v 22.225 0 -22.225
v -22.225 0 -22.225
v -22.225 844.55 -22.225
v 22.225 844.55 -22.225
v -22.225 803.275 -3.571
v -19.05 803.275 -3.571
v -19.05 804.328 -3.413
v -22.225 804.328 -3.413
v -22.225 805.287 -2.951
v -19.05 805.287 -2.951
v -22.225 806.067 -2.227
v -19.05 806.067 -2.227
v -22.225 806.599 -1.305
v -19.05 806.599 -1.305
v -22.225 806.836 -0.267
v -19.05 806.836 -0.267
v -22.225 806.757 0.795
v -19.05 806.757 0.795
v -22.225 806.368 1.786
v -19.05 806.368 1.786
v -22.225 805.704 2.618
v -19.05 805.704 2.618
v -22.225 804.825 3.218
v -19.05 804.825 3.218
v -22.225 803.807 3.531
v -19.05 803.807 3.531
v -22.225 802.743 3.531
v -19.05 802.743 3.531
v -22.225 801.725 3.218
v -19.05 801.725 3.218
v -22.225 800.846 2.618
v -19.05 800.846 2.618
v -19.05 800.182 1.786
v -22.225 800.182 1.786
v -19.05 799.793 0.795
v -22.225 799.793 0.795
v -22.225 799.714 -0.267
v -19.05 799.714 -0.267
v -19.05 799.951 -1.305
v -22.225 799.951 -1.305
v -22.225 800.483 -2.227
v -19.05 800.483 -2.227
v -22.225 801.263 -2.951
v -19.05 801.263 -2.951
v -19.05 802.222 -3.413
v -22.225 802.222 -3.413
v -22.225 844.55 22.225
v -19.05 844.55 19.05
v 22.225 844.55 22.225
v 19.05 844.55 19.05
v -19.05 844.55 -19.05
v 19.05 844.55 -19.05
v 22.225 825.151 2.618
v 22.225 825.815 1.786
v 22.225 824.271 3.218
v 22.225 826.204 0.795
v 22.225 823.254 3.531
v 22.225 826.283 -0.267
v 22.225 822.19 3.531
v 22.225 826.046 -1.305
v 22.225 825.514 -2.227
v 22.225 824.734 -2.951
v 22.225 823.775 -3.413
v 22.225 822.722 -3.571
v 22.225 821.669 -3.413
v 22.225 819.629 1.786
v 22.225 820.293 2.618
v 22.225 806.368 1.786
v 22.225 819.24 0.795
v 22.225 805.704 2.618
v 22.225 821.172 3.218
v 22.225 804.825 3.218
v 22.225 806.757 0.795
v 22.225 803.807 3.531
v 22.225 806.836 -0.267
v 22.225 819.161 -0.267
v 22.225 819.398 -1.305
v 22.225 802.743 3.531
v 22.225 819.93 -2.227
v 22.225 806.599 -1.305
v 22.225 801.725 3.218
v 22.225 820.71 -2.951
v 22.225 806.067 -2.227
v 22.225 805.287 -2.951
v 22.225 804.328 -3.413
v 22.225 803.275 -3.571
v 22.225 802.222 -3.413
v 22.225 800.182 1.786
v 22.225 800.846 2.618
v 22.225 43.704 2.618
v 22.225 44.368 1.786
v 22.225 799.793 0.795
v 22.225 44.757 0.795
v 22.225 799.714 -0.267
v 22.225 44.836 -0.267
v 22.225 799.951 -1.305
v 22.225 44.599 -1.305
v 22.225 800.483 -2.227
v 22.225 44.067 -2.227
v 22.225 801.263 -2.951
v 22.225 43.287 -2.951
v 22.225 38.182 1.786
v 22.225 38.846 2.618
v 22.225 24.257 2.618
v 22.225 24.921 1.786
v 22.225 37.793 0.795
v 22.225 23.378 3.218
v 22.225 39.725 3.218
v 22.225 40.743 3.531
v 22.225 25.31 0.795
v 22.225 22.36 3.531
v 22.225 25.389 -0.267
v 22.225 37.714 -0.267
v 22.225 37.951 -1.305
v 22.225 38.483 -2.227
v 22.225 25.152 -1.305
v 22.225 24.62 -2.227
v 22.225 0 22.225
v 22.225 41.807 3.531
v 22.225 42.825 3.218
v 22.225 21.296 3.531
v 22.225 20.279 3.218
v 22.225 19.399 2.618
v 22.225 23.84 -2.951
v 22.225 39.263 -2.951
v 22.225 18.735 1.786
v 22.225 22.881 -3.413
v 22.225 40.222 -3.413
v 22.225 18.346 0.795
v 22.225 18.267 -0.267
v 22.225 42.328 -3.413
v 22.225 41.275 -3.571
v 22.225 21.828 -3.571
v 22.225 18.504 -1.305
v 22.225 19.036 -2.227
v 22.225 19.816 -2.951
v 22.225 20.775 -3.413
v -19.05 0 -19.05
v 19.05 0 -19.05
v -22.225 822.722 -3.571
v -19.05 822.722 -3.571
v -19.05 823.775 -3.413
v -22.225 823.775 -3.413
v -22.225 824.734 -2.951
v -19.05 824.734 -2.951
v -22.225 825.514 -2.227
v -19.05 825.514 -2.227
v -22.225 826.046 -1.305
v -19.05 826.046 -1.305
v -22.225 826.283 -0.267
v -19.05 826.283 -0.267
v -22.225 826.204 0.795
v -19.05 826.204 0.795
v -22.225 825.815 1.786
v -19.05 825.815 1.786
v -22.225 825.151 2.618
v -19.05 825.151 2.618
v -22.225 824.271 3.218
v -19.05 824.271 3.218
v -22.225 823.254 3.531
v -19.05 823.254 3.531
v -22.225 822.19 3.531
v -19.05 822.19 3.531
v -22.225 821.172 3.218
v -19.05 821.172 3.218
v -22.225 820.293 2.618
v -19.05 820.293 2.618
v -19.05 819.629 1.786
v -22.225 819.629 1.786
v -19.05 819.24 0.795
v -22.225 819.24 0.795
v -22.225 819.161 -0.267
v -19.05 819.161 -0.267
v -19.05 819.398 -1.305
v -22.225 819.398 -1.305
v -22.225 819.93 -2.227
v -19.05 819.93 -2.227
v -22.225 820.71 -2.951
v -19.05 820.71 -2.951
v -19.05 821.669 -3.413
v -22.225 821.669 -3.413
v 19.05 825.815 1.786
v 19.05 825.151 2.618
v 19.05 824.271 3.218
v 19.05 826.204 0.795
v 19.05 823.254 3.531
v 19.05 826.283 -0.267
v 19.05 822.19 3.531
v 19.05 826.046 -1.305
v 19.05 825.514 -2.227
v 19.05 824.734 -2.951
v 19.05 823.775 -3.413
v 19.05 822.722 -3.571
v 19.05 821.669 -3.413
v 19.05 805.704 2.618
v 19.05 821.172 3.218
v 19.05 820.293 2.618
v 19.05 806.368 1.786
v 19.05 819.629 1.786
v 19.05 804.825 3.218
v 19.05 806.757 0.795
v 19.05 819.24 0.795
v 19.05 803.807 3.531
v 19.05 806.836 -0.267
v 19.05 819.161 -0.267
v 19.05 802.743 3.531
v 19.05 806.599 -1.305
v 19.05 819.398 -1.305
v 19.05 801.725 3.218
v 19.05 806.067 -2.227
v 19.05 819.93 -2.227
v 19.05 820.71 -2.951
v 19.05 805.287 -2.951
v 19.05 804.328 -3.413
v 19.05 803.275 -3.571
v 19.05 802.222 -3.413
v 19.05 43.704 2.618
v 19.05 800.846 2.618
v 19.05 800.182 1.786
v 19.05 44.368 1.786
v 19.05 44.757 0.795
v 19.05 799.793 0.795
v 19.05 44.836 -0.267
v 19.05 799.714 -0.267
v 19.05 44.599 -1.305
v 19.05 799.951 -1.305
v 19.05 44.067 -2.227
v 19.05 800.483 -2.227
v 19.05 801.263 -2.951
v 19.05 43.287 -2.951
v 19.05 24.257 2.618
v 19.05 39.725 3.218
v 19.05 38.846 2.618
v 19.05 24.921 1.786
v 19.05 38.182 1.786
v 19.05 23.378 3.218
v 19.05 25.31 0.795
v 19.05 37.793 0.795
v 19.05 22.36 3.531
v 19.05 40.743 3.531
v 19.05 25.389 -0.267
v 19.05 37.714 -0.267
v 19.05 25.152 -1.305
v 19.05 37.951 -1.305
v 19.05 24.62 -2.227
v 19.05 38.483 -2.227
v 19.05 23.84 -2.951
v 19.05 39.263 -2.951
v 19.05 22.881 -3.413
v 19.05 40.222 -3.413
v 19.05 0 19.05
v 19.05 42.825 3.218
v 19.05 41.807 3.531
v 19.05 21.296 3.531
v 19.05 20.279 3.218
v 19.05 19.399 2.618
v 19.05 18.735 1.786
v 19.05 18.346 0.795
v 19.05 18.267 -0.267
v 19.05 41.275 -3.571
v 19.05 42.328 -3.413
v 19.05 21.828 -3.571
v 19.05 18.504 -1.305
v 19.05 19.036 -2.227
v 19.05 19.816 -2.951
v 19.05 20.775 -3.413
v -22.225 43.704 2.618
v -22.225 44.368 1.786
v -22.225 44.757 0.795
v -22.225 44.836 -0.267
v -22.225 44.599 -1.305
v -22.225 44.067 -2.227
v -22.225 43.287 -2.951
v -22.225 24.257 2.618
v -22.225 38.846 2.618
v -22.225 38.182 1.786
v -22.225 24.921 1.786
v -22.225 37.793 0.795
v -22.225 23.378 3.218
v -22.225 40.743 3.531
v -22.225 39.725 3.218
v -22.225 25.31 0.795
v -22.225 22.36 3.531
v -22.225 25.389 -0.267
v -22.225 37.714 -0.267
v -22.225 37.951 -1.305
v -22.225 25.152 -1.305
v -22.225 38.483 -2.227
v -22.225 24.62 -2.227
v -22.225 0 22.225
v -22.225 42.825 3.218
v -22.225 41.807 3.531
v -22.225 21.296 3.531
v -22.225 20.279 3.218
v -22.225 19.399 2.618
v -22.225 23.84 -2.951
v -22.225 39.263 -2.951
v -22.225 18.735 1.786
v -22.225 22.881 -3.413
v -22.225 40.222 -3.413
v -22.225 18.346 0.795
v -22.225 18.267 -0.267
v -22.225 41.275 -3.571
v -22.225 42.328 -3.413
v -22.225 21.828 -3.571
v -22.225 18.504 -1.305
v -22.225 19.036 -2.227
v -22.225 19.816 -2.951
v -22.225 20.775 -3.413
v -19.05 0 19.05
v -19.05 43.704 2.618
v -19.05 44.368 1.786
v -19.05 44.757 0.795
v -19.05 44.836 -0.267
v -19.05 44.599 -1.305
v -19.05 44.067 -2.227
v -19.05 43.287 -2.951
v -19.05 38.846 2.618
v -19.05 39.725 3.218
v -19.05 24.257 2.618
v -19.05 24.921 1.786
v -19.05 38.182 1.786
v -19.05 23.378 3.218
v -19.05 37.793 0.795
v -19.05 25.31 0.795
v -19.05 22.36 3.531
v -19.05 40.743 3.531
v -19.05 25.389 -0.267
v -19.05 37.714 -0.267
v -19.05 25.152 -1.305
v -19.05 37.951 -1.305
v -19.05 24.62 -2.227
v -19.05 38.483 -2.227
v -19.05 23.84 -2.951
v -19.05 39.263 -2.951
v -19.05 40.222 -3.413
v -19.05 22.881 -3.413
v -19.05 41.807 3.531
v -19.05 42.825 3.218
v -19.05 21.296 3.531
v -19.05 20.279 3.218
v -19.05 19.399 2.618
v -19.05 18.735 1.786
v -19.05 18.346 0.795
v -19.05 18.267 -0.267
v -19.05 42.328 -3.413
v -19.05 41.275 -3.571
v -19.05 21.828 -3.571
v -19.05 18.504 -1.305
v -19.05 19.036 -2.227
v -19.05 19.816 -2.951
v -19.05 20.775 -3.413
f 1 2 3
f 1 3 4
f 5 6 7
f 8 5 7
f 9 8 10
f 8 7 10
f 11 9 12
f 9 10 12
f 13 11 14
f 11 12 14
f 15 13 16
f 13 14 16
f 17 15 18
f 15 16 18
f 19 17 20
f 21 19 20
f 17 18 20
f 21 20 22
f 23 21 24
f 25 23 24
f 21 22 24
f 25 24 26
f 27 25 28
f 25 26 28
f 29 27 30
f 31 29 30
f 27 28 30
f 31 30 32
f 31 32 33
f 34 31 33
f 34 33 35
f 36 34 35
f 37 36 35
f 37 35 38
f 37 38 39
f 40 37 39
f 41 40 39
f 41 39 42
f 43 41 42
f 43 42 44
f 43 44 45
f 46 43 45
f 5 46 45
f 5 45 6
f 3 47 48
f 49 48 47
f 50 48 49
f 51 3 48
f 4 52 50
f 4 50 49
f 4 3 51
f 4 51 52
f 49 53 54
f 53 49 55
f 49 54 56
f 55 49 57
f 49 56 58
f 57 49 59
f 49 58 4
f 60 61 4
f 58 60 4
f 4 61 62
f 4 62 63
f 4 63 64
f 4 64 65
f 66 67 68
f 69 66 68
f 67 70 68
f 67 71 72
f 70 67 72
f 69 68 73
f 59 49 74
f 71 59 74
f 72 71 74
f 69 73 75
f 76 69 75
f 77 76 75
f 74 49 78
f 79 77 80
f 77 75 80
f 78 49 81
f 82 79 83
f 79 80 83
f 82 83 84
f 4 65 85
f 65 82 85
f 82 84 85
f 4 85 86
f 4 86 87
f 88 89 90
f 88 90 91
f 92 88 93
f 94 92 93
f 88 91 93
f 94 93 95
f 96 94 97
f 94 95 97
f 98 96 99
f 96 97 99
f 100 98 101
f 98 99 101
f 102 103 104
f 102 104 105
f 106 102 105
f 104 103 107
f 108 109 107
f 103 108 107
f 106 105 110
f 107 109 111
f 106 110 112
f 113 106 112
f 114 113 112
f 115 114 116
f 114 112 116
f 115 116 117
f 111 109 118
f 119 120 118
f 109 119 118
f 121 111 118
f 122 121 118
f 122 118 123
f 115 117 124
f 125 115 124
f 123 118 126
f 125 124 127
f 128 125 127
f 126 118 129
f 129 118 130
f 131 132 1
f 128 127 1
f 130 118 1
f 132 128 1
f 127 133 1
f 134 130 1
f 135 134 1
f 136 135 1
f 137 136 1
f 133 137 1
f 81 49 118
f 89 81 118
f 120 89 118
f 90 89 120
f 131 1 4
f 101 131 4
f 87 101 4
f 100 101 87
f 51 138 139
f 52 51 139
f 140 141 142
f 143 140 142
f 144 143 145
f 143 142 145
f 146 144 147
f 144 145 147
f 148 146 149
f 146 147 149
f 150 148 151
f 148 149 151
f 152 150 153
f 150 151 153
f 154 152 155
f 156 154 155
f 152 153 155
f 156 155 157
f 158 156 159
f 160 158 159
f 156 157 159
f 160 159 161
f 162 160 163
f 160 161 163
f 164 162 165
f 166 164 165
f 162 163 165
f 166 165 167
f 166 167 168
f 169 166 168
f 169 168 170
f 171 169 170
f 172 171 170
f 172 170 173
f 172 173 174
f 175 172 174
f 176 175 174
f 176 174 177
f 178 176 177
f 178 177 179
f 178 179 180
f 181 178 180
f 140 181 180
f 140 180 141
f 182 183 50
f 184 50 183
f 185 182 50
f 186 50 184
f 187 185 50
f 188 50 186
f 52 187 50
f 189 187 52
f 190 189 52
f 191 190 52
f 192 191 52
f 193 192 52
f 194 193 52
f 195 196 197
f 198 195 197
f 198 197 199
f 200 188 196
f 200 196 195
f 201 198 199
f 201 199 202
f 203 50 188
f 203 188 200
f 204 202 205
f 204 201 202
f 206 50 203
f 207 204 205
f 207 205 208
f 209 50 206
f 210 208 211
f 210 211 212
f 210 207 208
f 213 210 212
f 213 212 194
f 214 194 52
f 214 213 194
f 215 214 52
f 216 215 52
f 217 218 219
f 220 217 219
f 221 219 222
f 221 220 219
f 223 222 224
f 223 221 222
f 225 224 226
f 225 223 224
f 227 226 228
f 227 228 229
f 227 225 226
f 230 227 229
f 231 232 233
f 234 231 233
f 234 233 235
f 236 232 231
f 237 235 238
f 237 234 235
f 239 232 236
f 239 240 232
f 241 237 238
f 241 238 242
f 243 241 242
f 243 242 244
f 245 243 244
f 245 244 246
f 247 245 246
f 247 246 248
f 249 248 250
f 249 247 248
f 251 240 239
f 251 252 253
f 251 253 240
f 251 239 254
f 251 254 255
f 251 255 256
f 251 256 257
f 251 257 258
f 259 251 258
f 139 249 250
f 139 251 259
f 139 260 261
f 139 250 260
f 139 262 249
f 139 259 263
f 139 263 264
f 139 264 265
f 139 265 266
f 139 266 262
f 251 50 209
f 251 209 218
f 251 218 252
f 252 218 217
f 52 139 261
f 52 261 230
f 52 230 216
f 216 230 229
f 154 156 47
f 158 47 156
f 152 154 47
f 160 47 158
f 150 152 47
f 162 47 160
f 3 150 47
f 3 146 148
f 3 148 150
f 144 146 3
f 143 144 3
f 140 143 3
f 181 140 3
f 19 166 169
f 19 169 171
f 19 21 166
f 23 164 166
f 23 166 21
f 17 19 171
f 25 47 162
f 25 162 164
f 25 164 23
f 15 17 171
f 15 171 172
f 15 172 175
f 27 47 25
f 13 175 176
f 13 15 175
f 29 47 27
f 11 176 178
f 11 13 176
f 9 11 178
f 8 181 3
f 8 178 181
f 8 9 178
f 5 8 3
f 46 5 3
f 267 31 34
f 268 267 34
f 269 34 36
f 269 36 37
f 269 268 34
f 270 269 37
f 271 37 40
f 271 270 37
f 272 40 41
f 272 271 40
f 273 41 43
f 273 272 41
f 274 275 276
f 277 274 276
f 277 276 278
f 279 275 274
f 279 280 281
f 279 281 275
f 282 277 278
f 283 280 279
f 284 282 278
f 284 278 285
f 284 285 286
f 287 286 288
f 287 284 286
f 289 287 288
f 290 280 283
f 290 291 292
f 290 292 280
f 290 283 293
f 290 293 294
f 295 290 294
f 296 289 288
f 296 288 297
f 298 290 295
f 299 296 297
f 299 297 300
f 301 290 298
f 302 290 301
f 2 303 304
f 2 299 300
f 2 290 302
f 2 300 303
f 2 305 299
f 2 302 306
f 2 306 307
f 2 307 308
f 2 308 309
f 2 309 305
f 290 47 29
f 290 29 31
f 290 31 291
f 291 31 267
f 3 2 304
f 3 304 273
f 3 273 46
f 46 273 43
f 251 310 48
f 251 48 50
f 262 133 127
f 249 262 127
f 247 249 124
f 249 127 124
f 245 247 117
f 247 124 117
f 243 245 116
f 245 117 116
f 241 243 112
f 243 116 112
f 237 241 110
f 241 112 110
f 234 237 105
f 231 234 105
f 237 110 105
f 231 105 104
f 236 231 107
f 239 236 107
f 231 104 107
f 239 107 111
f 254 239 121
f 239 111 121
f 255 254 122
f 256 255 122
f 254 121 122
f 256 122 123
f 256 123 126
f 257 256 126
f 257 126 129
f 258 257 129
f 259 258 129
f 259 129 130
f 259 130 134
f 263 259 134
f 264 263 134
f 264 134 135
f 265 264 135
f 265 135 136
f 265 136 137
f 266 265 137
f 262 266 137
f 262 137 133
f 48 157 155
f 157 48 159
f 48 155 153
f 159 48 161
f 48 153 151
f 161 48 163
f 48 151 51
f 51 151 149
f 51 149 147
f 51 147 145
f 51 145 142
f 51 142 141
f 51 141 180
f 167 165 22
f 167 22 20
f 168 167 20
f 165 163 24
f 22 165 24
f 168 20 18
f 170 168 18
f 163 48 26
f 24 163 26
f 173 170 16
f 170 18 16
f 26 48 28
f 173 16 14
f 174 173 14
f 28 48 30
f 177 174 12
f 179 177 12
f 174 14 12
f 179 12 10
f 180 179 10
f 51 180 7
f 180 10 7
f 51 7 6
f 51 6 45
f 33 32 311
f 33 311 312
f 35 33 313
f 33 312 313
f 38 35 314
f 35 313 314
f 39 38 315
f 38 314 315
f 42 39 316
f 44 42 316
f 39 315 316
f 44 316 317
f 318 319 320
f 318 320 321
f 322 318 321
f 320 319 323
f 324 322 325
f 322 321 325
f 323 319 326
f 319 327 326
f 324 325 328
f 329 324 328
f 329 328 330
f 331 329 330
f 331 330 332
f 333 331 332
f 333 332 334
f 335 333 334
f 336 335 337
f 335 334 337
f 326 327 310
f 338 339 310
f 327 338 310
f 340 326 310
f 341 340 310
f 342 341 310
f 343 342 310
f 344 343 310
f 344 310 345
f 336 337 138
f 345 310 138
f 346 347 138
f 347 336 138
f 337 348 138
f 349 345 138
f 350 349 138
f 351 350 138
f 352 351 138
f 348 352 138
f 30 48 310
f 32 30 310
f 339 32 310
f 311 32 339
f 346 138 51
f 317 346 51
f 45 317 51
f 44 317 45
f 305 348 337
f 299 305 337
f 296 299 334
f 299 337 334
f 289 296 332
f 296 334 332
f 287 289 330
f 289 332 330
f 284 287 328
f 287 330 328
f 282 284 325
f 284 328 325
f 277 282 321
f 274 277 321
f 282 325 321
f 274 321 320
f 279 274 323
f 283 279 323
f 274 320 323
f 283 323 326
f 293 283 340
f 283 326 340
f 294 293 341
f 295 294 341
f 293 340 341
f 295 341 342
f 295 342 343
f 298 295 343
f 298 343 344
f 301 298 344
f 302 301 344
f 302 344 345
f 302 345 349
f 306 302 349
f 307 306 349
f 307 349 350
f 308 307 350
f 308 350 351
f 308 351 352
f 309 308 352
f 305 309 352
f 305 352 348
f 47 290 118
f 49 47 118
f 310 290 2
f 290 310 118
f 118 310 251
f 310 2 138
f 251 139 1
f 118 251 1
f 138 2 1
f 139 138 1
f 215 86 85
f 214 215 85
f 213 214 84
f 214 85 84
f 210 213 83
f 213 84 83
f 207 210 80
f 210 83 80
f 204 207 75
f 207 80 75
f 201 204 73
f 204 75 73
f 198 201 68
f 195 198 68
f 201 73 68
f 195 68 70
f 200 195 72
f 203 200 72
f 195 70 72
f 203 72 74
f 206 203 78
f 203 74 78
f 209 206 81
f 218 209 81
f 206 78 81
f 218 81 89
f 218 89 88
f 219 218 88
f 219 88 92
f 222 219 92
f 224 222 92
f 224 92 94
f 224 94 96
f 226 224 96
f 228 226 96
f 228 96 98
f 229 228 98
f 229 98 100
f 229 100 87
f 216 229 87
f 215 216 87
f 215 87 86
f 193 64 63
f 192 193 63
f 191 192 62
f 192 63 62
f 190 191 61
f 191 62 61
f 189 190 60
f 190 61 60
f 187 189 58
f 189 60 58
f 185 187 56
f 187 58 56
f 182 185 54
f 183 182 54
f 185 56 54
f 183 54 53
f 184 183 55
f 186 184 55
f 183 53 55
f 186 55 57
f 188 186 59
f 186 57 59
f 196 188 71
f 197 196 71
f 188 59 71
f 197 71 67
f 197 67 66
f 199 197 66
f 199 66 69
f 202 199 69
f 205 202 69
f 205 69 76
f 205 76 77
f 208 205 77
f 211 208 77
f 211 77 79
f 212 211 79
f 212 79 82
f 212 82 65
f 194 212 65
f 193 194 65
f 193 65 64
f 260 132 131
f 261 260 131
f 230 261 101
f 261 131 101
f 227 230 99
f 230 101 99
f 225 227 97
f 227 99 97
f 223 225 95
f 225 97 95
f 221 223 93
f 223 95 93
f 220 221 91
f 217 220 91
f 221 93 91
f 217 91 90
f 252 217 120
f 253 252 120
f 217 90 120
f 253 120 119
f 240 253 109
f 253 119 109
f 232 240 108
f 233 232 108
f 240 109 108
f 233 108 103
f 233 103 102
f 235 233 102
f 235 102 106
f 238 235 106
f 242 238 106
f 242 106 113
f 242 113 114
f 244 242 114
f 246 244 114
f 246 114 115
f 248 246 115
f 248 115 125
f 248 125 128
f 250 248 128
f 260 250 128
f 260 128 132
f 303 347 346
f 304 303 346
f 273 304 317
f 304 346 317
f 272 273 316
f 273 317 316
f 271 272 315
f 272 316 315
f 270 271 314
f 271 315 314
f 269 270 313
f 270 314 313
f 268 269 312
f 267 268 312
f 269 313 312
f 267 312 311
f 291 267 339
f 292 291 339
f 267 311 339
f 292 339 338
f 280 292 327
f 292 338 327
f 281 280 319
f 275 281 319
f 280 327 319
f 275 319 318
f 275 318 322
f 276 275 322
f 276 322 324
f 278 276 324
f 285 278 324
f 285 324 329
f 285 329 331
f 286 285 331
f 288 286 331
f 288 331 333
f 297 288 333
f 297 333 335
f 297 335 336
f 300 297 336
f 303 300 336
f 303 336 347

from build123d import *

# Parameters (mm, degrees)
SKETCH1_W               = 44.45
SKETCH1_H               = 44.45
SKETCH1_W_2             = 38.1
SKETCH1_H_2             = 38.1
BOSS_EXTRUDE1_DEPTH     = 844.55
F_1_4_CLEARANCE_HOLE1_D = 7.14248


with BuildPart() as part:
    # Sketch1 → Boss-Extrude1 (new body)
    with BuildSketch(Plane(origin=(0, 0, 0), x_dir=(1, 0, 0), z_dir=(0, 1, 0))):
        Rectangle(SKETCH1_W, SKETCH1_H)
        Rectangle(SKETCH1_W_2, SKETCH1_H_2, mode=Mode.SUBTRACT)
    extrude(amount=BOSS_EXTRUDE1_DEPTH)

    # 1/4 Clearance Hole1 (through all)
    with Locations(Plane.ZY.offset(22.225)):
        with Locations((0, 803.275), (0, 41.275), (0, 822.721875), (0, 21.828125)):
            Hole(F_1_4_CLEARANCE_HOLE1_D / 2)


solid = part.part
